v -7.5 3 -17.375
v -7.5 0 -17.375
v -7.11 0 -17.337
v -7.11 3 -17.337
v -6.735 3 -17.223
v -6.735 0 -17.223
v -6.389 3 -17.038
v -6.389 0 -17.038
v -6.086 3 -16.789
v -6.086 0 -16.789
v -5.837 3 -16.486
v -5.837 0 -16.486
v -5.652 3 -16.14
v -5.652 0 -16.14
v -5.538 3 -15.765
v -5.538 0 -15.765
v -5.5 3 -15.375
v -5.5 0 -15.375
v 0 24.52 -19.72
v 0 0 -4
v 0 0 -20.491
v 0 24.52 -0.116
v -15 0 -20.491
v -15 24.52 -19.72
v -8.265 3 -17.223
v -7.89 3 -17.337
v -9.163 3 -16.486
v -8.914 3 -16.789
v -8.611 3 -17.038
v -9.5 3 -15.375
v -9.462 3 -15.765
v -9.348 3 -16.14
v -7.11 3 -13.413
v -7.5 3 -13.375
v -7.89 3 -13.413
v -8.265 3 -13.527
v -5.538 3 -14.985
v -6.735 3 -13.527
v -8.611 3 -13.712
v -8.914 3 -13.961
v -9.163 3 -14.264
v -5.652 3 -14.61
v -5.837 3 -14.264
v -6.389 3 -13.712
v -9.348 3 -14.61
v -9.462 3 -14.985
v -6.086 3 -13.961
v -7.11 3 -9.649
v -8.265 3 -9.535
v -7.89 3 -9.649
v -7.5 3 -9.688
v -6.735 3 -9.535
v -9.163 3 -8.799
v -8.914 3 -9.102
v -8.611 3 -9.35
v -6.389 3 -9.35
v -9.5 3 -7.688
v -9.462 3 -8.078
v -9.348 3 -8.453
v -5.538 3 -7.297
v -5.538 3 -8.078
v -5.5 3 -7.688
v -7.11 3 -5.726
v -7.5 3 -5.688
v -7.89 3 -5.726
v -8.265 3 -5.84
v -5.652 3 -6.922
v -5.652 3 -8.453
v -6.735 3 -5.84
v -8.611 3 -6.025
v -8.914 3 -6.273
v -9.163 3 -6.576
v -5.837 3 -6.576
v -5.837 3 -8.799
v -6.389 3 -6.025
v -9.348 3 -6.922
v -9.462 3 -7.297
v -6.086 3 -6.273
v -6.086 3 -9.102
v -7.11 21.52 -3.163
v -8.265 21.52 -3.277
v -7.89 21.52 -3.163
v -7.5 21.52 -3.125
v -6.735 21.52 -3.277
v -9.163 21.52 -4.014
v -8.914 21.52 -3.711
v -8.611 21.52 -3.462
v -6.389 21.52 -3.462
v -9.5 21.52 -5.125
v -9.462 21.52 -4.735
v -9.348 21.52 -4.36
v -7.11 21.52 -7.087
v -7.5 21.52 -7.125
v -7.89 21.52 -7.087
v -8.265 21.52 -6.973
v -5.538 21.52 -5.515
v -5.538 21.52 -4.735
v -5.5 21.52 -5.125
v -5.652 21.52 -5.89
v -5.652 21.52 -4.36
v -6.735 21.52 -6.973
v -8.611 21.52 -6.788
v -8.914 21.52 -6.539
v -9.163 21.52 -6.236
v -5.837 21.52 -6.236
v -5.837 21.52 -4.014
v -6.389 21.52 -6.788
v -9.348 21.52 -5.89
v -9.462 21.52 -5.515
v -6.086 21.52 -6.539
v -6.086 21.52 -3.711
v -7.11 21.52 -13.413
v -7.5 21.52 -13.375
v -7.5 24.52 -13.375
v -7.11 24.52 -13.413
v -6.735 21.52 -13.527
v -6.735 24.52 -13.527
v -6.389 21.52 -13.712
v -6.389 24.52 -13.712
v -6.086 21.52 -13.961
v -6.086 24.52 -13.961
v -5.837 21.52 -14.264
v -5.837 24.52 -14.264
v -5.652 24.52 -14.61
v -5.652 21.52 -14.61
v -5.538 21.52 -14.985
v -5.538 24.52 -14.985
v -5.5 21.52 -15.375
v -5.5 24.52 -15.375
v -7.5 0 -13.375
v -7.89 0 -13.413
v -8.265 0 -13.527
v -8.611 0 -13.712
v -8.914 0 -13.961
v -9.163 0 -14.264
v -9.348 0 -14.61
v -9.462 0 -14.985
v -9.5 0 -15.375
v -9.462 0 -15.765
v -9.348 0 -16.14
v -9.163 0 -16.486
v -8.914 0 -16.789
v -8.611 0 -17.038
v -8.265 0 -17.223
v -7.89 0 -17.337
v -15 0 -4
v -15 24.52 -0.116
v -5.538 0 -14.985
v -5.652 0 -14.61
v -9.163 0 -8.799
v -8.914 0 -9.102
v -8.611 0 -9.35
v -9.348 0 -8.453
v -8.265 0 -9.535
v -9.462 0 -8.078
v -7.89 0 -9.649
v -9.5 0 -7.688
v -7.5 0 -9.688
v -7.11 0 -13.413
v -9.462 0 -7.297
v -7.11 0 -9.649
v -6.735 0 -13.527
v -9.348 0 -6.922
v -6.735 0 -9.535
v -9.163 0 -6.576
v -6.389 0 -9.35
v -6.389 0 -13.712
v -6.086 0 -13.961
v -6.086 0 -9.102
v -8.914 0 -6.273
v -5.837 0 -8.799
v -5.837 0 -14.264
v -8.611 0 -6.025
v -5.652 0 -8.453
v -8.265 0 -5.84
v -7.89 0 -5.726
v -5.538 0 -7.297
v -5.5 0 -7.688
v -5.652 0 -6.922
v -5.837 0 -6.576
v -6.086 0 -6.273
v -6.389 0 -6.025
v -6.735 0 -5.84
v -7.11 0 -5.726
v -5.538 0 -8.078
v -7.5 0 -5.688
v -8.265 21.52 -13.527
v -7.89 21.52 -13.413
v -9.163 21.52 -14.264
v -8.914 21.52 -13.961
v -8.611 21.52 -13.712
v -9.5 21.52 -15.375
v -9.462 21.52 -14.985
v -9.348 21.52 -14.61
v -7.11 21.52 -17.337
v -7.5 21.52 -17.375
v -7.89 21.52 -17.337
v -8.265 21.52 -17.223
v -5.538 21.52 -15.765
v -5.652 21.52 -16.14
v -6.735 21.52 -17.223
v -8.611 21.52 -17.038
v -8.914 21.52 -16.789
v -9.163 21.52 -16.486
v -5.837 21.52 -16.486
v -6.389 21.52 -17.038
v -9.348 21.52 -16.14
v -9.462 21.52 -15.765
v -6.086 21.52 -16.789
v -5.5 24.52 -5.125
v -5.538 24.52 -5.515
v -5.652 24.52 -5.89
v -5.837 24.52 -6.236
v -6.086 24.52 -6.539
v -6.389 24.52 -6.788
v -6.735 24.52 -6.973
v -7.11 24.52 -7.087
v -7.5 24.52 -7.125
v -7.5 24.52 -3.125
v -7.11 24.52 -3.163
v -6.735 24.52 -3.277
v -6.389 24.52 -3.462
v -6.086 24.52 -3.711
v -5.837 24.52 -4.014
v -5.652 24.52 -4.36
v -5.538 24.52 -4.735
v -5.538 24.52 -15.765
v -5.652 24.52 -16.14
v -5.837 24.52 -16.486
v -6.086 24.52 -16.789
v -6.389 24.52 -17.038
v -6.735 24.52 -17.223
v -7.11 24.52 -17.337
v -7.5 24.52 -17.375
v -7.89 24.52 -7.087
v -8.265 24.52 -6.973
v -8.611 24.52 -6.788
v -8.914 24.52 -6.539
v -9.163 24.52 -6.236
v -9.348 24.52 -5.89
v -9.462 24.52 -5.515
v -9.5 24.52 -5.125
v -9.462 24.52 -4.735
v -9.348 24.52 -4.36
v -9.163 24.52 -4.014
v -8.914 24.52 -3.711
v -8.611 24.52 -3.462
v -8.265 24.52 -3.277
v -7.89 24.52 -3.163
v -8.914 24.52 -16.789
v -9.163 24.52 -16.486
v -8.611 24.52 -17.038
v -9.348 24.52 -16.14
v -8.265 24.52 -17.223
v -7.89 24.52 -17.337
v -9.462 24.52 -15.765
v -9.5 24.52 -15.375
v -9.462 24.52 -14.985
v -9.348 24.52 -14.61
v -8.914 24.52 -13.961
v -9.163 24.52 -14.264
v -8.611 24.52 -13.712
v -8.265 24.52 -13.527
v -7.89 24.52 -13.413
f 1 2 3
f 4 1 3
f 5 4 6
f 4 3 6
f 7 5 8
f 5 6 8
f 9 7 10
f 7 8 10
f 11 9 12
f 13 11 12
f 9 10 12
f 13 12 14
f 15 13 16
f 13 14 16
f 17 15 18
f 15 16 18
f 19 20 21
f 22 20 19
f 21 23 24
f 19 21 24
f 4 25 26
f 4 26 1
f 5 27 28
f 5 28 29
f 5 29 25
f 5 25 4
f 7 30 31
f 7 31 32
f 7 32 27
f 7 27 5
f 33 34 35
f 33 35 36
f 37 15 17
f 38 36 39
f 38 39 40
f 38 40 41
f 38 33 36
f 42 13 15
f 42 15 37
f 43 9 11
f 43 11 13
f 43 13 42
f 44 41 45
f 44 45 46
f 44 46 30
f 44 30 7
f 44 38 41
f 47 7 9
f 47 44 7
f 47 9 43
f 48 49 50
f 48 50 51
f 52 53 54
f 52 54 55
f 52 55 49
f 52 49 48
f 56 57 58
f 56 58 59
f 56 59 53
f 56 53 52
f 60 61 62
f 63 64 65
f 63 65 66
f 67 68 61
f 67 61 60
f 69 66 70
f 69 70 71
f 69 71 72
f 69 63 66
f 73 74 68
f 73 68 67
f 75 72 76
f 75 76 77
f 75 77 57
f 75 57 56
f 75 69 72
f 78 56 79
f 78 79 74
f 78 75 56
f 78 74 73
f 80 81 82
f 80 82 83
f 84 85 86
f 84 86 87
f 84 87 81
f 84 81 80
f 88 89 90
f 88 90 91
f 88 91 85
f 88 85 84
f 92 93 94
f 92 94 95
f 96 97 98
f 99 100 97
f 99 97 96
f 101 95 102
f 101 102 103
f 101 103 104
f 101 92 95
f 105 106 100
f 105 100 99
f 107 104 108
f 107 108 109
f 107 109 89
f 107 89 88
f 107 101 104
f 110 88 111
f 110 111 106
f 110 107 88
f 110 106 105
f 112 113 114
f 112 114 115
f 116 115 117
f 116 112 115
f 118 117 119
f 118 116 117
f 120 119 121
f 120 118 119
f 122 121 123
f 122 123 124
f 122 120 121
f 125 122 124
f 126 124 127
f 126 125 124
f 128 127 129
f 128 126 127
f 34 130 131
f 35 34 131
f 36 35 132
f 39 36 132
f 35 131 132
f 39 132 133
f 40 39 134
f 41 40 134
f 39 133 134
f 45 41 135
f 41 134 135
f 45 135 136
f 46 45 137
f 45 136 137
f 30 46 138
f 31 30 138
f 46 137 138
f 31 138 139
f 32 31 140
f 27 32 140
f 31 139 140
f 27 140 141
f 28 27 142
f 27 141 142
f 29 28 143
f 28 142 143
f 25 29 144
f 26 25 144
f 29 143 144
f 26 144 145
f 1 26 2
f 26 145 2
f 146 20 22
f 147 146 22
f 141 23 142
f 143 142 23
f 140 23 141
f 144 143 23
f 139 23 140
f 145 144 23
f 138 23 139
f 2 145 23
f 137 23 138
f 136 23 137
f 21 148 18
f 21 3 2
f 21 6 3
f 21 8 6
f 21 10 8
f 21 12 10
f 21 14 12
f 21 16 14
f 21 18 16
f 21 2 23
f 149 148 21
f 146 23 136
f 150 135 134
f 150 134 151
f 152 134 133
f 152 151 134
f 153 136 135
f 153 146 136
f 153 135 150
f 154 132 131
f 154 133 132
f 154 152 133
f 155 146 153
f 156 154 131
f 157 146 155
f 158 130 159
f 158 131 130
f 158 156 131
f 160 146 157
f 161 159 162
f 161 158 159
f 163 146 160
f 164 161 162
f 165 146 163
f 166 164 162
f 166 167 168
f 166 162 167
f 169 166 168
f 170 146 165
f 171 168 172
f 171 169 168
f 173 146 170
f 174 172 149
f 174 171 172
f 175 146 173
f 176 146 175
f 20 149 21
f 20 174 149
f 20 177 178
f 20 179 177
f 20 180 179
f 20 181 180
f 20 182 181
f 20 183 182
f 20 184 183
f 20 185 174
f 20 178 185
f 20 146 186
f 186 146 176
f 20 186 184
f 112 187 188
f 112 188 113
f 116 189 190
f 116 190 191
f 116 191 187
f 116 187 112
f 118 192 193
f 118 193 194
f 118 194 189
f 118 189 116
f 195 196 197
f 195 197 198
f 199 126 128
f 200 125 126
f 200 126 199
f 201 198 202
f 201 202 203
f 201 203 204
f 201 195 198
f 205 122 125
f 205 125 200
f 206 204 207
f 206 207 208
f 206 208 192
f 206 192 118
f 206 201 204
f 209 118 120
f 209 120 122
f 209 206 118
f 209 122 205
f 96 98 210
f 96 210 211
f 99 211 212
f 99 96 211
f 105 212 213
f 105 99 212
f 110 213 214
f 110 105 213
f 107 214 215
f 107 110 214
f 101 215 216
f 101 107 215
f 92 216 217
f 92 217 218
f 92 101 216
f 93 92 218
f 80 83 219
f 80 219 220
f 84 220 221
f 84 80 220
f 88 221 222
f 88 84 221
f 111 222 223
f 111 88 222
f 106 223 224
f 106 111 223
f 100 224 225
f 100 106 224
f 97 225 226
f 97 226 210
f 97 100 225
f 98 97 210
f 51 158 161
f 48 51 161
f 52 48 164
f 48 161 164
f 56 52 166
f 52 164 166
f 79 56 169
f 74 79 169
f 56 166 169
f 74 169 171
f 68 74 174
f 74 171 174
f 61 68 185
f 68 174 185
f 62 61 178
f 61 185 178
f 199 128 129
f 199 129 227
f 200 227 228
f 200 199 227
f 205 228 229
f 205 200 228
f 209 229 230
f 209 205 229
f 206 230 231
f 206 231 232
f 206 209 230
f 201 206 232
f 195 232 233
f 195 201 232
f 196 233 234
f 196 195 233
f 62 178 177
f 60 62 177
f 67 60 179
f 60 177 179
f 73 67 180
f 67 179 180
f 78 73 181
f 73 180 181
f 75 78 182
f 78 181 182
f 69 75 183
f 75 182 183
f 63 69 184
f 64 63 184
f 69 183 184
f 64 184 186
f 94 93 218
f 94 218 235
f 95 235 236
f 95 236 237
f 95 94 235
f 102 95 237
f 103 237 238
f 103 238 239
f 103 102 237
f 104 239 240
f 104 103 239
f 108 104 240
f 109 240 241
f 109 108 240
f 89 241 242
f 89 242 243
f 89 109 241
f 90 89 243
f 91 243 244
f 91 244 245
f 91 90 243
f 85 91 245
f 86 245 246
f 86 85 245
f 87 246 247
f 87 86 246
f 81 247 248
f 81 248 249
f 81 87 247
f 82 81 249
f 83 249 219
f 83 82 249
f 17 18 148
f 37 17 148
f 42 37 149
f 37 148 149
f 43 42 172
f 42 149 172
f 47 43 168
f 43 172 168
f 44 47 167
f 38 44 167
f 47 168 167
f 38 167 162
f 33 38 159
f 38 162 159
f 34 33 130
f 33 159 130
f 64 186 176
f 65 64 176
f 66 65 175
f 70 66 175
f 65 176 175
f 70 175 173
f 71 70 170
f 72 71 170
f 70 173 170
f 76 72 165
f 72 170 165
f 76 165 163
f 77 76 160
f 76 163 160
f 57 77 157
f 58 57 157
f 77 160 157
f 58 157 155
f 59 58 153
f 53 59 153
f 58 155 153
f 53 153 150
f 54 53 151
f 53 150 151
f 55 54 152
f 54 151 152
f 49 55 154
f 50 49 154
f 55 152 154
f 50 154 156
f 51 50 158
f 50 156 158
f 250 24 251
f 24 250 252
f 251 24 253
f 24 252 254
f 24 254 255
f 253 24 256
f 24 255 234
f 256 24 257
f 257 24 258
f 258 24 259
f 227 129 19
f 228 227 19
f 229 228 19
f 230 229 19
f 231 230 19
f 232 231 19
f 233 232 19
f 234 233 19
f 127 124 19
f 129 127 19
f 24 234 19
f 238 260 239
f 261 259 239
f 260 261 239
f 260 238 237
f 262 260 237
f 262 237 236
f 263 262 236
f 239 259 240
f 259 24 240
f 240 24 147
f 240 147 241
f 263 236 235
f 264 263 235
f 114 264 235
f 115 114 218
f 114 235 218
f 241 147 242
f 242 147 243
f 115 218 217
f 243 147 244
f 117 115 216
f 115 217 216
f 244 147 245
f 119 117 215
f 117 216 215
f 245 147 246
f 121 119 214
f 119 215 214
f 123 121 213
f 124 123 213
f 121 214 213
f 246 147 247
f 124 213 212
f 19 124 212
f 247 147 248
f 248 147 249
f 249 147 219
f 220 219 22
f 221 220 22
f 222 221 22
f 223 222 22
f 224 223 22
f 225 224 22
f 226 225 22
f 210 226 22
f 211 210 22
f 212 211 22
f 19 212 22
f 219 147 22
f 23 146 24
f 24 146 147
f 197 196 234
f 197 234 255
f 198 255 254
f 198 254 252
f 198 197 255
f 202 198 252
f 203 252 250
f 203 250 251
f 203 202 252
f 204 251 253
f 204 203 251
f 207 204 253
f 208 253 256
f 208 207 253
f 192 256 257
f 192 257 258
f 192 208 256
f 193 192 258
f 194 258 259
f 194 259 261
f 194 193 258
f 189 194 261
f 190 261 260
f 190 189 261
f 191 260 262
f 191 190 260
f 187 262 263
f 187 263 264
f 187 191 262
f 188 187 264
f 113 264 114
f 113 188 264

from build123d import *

# Parameters (mm, degrees)
ESQUISSE1_W             = 15
ESQUISSE1_H             = 24.52
BOSS_EXTRU_1_DEPTH      = 20.5
ENL_V_MAT_EXTRU_2_DEPTH = 3
ENL_V_START             = -3
ENL_V_MAT_EXTRU_1_DEPTH = 3
CHANFREIN2_SIZE         = 4
CHANFREIN2_SIZE_2       = 25.255006059
CHANFREIN3_SIZE         = 24.820002444
CHANFREIN3_SIZE_2       = 0.78


with BuildPart() as part:
    # Esquisse1 → Boss.-Extru.1 (new body)
    with BuildSketch(Plane.XY):
        with Locations((-7.5, 12.26)):
            Rectangle(ESQUISSE1_W, ESQUISSE1_H)
    extrude(amount=-BOSS_EXTRU_1_DEPTH)

    # Esquisse3 → Enlèv. mat.-Extru.2 (cut)
    with BuildSketch(Plane.XZ):
        with BuildLine():
            ThreePointArc((-5.5, -15.375), (-6.085786438, -13.960786438), (-7.5, -13.375))
            Line((-7.5, -13.375), (-7.5, -15.375))
            Line((-7.5, -15.375), (-7.5, -17.375))
            ThreePointArc((-7.5, -17.375), (-6.085786438, -16.789213562), (-5.5, -15.375))
        make_face()
        with BuildLine():
            Line((-7.5, -15.375), (-7.5, -13.375))
            ThreePointArc((-7.5, -13.375), (-9.5, -15.375), (-7.5, -17.375))
            Line((-7.5, -17.375), (-7.5, -15.375))
        make_face()
        with BuildLine():
            ThreePointArc((-7.5, -5.6875), (-9.5, -7.6875), (-7.5, -9.6875))
            Line((-7.5, -9.6875), (-7.5, -5.6875))
        make_face()
        with BuildLine():
            Line((-7.5, -5.6875), (-7.5, -9.6875))
            ThreePointArc((-7.5, -9.6875), (-6.085786438, -9.101713562), (-5.5, -7.6875))
            ThreePointArc((-5.5, -7.6875), (-6.085786438, -6.273286438), (-7.5, -5.6875))
        make_face()
    extrude(amount=-ENL_V_MAT_EXTRU_2_DEPTH, mode=Mode.SUBTRACT)

    # Esquisse2 → Enlèv. mat.-Extru.1 (cut)
    with BuildSketch(Plane(origin=(0, 24.52, 0), x_dir=(1, 0, 0), z_dir=(0, 1, 0)).offset(ENL_V_START)):
        with BuildLine():
            ThreePointArc((-7.5, 17.375), (-9.5, 15.375), (-7.5, 13.375))
            Line((-7.5, 13.375), (-7.5, 17.375))
        make_face()
        with BuildLine():
            Line((-7.5, 17.375), (-7.5, 13.375))
            ThreePointArc((-7.5, 13.375), (-6.085786438, 13.960786438), (-5.5, 15.375))
            ThreePointArc((-5.5, 15.375), (-6.085786438, 16.789213562), (-7.5, 17.375))
        make_face()
        with BuildLine():
            ThreePointArc((-5.5, 5.125), (-6.085786438, 6.539213562), (-7.5, 7.125))
            Line((-7.5, 7.125), (-7.5, 3.125))
            ThreePointArc((-7.5, 3.125), (-6.085786438, 3.710786438), (-5.5, 5.125))
        make_face()
        with BuildLine():
            Line((-7.5, 3.125), (-7.5, 7.125))
            ThreePointArc((-7.5, 7.125), (-9.5, 5.125), (-7.5, 3.125))
        make_face()
    extrude(amount=ENL_V_MAT_EXTRU_1_DEPTH, mode=Mode.SUBTRACT)

    # Chanfrein2
    # the kernel refuses this chamfer: 25.255006059, 4 mm, written as the material it takes off along each edge
    with BuildSketch(Plane(origin=(65.633111729, 0, 0), x_dir=(0, -0.2333366369919624, -0.9723960169793381), z_dir=(-1, 0, 0))) as chanfrein2_piece_1:
        Polygon((CHANFREIN2_SIZE * 0.972396016979, -CHANFREIN2_SIZE * 0.233336636992), (-CHANFREIN2_SIZE_2 * 0.233336636989, -CHANFREIN2_SIZE_2 * 0.972396016968), (0, 0), align=None)
    extrude(amount=146.266223457, mode=Mode.SUBTRACT)

    # Chanfrein3
    # the kernel refuses this chamfer: 24.820002444, 0.78 mm, written as the material it takes off along each edge
    with BuildSketch(Plane(origin=(-79.530828731, 24.52, -20.5), x_dir=(0, -0.999999270212902, -0.0012081281651260673), z_dir=(1, 0, 0))) as chanfrein3_piece_1:
        Polygon((CHANFREIN3_SIZE * 0.999999270211, -CHANFREIN3_SIZE * 0.00120812816512), (-CHANFREIN3_SIZE_2 * 0.00120812816513, -CHANFREIN3_SIZE_2 * 0.999999270213), (0, 0), align=None)
    extrude(amount=144.061657461, mode=Mode.SUBTRACT)


solid = part.part
